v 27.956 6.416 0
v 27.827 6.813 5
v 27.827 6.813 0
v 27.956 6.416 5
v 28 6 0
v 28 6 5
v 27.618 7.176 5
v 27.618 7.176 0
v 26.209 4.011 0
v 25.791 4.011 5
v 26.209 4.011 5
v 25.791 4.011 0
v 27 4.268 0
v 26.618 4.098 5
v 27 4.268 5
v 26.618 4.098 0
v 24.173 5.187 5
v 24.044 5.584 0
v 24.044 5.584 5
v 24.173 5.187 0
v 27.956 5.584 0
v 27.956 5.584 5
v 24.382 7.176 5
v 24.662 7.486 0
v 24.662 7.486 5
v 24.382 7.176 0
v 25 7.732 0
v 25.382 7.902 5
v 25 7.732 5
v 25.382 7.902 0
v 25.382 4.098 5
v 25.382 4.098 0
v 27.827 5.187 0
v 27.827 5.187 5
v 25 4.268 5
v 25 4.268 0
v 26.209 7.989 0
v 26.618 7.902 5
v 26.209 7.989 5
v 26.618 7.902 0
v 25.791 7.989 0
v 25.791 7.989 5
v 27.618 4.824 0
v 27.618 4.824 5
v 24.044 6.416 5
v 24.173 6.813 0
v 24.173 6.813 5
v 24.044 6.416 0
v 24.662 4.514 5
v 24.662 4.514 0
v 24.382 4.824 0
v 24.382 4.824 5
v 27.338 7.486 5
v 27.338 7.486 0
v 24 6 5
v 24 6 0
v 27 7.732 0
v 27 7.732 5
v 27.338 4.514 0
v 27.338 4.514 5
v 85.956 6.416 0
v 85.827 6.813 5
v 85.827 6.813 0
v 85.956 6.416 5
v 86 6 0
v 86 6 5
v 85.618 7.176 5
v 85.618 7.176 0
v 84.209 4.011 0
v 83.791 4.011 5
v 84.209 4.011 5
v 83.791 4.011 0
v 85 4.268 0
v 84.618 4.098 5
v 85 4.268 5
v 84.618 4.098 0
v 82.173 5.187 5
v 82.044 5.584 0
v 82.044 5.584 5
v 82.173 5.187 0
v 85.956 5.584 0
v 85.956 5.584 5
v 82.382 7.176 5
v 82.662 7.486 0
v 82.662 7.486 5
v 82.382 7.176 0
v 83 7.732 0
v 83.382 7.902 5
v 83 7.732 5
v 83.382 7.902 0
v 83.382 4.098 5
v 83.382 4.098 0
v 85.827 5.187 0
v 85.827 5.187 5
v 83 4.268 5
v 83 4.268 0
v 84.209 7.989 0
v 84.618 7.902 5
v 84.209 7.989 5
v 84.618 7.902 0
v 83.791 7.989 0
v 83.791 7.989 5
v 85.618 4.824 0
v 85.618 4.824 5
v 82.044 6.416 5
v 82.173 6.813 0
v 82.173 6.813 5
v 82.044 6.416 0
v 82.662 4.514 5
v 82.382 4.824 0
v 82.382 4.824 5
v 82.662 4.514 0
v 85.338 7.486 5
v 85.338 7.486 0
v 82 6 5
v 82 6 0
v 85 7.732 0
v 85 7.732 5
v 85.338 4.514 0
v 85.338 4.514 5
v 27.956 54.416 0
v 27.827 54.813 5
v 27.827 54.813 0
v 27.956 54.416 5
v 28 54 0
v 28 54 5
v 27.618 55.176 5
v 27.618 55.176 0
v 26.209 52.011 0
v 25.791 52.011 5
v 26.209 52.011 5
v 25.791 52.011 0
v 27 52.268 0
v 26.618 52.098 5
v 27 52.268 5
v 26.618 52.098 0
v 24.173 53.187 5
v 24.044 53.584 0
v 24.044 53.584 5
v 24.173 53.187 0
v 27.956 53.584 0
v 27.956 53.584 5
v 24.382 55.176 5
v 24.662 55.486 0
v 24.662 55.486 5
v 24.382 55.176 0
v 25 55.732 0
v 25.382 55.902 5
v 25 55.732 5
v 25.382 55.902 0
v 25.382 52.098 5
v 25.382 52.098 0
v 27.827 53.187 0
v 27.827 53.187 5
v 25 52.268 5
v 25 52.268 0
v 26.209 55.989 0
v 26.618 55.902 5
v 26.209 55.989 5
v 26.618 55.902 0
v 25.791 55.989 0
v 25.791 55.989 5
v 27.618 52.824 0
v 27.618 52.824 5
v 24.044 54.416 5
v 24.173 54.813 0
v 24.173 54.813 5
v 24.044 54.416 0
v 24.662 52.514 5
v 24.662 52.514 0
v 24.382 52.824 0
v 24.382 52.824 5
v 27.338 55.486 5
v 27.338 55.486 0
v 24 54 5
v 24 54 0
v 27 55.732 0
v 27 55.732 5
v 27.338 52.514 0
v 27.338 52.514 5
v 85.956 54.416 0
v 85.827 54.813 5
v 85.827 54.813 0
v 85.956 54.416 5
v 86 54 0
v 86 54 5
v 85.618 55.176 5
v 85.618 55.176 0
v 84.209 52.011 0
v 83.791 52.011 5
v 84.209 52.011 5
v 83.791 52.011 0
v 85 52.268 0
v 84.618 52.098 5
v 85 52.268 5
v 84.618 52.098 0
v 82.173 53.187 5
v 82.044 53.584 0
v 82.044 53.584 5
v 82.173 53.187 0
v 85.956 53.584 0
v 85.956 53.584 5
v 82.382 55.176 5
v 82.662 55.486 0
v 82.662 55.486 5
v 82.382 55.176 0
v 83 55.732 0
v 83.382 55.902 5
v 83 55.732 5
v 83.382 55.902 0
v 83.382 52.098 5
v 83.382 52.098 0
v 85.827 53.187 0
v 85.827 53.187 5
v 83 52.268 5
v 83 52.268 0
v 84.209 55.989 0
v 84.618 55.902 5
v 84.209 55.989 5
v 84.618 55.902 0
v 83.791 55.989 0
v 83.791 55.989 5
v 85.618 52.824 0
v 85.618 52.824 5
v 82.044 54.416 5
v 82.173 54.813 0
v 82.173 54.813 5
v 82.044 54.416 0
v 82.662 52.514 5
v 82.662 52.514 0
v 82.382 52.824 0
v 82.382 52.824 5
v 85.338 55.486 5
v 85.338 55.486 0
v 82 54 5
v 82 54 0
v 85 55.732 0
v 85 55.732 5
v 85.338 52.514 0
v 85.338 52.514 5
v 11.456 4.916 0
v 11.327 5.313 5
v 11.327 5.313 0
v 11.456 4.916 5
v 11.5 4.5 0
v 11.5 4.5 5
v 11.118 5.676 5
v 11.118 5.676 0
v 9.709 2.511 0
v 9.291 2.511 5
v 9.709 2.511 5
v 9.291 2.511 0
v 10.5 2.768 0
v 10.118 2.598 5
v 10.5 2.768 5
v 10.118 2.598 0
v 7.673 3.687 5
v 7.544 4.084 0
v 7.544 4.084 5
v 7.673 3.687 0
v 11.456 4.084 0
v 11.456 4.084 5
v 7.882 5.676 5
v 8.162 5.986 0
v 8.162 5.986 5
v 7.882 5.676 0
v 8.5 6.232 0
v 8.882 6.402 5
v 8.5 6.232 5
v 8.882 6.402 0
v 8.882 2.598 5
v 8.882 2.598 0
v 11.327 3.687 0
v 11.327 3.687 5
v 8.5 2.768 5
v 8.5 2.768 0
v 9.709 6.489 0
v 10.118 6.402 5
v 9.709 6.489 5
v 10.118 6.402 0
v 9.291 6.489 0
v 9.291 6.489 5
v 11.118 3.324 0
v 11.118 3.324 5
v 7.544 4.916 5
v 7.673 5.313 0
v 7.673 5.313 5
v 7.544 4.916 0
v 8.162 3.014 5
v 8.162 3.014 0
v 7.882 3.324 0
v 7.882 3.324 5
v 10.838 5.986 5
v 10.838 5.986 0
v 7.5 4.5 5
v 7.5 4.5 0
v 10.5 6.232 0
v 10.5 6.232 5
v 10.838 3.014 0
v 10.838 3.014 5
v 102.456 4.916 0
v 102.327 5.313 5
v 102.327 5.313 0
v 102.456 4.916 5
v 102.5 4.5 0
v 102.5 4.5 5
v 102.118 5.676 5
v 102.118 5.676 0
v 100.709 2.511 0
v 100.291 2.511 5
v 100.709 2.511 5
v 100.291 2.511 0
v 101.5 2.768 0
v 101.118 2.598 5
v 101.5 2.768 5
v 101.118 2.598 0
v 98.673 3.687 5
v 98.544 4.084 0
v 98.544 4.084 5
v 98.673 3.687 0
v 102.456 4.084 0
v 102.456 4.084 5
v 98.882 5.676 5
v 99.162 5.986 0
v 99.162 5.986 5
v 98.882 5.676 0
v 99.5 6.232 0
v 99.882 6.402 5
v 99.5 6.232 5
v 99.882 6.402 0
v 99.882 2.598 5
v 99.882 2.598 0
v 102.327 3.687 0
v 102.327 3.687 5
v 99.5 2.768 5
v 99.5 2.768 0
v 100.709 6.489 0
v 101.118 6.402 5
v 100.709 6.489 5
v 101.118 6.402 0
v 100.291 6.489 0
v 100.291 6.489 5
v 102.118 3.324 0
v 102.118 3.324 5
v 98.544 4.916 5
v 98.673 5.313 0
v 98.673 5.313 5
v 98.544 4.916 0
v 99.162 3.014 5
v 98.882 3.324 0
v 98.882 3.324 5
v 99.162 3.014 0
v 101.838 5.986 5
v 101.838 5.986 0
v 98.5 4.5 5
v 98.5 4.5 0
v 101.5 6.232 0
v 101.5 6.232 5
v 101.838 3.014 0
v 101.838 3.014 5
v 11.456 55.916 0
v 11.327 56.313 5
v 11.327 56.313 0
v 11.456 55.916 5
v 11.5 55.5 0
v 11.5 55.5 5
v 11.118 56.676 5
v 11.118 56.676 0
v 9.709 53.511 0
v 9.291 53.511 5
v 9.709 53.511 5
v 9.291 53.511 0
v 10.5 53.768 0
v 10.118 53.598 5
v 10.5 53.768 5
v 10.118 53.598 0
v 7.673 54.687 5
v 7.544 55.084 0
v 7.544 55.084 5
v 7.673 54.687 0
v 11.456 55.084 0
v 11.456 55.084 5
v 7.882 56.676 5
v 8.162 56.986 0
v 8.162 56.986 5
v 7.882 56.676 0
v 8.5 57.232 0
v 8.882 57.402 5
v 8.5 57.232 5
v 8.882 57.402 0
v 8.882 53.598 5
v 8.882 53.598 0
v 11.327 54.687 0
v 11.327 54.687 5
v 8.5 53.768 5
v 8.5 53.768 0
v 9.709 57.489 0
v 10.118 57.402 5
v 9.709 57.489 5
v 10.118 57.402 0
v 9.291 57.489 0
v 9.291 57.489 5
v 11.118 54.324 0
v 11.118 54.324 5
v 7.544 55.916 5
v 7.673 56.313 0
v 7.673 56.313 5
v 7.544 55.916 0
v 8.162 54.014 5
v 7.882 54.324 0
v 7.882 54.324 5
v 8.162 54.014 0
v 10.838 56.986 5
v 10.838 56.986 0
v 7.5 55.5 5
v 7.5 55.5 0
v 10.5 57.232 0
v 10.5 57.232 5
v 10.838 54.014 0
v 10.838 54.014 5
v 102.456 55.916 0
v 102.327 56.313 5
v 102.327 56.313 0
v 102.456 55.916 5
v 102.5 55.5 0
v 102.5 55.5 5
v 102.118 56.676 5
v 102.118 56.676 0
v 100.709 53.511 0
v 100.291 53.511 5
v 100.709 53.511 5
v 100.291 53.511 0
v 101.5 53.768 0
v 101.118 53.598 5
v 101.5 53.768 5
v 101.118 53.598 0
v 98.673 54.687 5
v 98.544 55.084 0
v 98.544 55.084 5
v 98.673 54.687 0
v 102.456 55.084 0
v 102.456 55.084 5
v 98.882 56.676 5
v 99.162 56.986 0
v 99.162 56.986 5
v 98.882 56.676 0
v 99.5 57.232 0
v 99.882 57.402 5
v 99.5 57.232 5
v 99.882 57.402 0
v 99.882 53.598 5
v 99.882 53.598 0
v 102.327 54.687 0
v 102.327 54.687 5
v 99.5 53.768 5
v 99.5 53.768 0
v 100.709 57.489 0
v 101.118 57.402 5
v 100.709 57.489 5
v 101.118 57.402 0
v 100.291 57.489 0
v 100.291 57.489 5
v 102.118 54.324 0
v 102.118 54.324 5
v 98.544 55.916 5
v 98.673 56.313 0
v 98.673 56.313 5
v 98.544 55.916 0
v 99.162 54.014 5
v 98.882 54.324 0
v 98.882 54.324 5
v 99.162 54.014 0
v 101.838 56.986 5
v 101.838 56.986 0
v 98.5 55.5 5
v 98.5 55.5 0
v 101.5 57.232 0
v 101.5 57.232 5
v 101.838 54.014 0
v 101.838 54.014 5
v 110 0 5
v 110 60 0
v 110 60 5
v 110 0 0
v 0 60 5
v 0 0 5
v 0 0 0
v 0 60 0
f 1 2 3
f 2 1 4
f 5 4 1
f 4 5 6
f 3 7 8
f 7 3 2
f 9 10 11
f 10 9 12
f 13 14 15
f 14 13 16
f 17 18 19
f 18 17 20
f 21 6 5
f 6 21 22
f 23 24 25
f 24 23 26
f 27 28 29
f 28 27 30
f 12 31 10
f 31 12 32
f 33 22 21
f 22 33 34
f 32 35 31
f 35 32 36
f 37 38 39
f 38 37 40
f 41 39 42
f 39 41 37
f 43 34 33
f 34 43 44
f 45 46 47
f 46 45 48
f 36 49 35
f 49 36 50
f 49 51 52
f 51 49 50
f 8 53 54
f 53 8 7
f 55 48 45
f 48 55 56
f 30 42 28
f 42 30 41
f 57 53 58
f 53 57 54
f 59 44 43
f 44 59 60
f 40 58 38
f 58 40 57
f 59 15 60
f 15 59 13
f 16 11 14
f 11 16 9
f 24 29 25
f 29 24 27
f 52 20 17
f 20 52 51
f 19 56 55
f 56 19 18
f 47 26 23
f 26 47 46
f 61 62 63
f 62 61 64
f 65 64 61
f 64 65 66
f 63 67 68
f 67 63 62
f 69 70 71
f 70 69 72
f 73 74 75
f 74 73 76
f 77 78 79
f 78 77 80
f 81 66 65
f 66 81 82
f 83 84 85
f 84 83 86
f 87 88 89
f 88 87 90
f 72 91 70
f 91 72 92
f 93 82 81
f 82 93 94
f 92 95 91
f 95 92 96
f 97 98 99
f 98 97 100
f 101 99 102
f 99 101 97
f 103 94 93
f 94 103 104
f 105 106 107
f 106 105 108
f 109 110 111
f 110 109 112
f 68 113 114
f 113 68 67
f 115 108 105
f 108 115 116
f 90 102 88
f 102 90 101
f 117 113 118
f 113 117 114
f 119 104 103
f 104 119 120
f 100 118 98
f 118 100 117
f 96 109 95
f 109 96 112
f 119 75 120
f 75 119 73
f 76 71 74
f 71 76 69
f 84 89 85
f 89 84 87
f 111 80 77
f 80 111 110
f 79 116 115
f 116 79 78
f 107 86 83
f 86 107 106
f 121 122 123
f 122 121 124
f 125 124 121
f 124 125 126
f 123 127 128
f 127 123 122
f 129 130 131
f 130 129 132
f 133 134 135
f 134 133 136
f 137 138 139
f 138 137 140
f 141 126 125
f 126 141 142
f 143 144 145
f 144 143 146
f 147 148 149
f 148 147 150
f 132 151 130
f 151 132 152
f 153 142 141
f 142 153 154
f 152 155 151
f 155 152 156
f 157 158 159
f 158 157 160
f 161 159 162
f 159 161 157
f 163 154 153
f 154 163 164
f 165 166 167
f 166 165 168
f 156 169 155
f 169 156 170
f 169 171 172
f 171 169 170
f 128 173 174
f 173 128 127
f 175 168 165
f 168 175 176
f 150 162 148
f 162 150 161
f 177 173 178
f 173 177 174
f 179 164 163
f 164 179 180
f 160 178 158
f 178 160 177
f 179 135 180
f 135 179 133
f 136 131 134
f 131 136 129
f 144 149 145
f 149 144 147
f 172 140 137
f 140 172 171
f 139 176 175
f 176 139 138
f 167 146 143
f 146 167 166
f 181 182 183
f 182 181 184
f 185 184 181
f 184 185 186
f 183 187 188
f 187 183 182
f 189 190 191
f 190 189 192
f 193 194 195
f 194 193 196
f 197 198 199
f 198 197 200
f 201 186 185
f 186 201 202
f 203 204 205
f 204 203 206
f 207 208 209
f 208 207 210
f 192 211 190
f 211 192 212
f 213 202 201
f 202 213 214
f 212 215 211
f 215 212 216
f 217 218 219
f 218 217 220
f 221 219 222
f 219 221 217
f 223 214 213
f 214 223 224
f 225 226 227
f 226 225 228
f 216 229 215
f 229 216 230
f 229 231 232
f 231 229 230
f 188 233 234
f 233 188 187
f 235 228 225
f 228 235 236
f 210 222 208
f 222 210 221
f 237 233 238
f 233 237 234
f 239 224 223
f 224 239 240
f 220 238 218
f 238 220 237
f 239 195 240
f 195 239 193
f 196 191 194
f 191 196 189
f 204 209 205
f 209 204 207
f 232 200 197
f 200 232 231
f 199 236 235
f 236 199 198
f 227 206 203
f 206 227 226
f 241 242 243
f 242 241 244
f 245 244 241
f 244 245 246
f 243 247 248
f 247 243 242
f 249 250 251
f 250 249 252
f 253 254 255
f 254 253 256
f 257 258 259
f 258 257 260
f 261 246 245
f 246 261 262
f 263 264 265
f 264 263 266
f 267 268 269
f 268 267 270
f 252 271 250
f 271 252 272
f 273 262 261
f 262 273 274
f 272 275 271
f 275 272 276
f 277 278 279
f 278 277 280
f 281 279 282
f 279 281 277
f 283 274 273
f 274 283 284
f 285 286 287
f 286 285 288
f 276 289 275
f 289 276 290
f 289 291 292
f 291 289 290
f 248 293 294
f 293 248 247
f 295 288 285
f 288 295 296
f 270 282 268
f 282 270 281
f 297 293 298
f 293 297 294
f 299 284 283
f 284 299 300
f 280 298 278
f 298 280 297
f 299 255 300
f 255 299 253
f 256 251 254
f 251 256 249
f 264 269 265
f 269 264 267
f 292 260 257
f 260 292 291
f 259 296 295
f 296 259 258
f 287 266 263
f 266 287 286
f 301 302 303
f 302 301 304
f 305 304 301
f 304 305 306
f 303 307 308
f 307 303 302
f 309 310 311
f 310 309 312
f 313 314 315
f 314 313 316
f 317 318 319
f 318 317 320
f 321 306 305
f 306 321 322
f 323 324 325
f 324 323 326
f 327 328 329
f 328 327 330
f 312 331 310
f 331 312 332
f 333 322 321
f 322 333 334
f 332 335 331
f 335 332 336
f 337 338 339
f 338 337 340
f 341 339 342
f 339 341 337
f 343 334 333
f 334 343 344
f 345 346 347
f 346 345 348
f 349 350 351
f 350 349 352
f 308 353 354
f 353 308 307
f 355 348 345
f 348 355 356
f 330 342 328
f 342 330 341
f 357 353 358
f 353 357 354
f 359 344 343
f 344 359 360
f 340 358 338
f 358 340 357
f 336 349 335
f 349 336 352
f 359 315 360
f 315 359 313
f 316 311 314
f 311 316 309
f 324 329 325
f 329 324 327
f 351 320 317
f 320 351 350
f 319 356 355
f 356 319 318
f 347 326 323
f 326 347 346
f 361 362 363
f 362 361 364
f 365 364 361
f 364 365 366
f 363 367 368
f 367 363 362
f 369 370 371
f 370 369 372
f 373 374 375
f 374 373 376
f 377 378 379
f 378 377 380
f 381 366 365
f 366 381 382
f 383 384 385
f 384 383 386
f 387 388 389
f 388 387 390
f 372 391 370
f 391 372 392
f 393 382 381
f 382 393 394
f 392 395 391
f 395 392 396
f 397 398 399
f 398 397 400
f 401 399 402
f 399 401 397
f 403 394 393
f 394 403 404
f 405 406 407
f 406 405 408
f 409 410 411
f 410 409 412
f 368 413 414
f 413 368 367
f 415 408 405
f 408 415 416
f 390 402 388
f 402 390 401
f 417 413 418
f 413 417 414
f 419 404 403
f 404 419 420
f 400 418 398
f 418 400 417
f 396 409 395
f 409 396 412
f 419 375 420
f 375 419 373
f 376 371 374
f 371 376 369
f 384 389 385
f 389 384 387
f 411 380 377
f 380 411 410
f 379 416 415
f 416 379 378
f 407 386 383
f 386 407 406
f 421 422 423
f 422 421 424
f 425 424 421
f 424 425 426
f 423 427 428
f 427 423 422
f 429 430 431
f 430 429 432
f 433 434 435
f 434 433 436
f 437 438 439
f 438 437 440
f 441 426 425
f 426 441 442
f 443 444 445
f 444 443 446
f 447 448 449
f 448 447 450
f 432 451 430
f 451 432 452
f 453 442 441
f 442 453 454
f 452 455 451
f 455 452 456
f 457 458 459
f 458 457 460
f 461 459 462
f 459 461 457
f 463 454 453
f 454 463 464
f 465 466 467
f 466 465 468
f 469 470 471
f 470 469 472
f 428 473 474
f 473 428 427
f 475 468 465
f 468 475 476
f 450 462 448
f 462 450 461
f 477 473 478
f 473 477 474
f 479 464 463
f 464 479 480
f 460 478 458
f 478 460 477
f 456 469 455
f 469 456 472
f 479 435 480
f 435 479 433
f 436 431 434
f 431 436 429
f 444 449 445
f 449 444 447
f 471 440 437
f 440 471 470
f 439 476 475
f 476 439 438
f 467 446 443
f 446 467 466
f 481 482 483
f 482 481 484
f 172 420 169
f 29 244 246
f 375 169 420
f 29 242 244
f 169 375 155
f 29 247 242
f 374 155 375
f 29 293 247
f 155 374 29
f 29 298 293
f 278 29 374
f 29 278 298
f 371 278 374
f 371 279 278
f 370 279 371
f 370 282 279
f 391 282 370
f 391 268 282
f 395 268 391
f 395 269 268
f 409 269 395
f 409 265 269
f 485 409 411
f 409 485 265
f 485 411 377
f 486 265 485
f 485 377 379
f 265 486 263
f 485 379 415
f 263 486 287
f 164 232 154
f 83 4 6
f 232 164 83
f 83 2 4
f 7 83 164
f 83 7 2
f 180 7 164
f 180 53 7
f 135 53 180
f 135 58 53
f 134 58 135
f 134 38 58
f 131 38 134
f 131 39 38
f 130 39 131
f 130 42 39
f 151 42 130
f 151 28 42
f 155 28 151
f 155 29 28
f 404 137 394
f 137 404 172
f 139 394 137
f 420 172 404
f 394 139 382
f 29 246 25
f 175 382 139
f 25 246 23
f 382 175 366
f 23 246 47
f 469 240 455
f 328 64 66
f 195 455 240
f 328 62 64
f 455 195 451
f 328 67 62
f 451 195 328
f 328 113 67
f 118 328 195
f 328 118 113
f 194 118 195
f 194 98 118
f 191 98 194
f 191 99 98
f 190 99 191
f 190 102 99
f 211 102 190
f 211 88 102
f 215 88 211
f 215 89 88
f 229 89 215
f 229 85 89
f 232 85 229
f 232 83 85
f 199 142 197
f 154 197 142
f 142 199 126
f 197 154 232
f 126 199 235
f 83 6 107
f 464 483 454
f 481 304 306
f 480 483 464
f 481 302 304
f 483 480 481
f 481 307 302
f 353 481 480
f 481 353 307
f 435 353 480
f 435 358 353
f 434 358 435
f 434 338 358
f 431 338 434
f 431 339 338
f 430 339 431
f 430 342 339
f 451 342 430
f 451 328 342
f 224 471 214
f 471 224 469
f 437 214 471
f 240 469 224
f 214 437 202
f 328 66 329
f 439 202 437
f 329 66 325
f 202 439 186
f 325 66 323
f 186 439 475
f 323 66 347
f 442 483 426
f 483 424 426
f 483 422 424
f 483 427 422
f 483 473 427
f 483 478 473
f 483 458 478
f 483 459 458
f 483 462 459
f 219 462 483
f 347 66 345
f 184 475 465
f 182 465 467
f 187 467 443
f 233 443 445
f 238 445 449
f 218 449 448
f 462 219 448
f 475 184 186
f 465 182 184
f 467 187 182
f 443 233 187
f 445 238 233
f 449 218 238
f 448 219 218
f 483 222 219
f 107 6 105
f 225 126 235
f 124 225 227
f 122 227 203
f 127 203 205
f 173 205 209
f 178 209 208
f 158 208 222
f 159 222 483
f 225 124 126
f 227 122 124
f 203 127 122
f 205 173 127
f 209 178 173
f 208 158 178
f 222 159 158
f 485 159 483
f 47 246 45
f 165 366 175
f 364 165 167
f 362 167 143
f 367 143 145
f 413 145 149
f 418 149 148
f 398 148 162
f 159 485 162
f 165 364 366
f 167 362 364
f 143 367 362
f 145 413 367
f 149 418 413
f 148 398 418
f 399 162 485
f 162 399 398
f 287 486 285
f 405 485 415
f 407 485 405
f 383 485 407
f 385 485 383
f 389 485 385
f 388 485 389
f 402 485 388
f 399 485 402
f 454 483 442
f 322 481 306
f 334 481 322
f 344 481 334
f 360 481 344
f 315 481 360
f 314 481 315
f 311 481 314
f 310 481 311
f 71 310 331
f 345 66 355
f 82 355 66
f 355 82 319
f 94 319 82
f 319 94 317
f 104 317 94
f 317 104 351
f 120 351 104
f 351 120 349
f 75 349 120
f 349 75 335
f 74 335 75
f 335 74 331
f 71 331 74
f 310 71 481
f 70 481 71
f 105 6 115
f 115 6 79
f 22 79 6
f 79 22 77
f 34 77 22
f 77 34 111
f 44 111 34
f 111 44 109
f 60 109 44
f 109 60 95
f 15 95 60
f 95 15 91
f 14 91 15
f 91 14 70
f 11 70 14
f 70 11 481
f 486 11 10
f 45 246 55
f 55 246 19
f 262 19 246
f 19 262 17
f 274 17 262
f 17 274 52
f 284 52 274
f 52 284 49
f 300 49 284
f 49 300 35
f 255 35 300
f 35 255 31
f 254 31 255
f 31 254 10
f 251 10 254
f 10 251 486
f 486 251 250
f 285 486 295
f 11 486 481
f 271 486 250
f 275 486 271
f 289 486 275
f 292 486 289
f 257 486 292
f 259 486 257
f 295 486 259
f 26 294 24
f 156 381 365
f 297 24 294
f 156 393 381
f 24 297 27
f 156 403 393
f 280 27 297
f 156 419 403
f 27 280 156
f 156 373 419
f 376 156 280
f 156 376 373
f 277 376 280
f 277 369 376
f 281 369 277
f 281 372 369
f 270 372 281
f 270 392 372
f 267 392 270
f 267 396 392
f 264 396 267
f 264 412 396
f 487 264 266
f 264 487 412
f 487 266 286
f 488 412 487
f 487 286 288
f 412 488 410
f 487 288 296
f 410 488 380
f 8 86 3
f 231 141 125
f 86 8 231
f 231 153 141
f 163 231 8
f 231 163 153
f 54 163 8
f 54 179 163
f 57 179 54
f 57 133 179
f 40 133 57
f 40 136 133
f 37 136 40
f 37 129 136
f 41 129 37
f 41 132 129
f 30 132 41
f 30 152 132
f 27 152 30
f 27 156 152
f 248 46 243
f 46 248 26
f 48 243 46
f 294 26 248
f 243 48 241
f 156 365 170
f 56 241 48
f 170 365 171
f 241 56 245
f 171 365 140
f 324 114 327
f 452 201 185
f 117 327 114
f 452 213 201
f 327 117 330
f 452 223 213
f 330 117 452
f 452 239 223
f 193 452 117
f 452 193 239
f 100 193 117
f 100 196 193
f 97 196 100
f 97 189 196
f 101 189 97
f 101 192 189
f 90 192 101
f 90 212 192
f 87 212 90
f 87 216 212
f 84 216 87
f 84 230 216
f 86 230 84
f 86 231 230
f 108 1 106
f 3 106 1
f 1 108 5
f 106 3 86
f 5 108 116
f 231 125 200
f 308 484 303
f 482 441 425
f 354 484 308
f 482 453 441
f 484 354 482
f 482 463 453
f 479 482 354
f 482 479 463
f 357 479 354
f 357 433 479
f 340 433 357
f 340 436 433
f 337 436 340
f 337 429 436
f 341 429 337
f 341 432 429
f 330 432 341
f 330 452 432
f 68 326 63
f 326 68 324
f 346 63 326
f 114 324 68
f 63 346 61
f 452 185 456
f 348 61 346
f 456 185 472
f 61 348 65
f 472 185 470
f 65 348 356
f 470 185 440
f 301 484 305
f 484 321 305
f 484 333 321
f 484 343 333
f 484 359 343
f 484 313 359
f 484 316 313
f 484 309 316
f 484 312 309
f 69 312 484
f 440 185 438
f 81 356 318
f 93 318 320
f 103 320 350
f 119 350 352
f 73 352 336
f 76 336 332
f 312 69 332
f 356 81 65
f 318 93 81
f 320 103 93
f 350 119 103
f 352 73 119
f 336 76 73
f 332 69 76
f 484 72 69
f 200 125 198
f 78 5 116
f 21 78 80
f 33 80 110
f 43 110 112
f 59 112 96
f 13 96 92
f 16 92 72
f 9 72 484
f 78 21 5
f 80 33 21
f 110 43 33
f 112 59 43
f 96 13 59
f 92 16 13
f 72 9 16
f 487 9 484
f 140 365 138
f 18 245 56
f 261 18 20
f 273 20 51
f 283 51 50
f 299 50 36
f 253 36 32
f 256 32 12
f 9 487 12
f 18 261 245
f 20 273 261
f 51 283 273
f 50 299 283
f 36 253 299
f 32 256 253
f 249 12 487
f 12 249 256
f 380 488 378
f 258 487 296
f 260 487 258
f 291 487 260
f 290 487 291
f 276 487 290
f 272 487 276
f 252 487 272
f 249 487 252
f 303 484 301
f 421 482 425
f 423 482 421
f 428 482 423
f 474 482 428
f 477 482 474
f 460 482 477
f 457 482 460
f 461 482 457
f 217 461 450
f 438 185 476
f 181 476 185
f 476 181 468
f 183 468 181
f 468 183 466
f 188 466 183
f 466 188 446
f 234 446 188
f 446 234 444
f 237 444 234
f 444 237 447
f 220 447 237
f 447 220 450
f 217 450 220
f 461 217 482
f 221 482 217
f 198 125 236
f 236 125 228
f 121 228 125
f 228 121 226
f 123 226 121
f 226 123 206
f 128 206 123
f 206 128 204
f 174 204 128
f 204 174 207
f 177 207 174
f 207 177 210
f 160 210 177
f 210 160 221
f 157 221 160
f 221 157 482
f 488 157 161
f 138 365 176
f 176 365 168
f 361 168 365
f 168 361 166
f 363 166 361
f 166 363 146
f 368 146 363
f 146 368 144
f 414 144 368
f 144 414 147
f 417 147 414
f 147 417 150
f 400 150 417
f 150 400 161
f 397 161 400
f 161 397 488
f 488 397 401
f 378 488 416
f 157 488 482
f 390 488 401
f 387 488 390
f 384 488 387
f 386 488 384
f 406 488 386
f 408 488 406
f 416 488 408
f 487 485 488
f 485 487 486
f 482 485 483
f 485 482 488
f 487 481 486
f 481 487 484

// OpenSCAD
$fn=30;
BASE_LEN=110;
BASE_WIDTH=60;
PI_WIDTH=54;
PI_LEN=64;
OUTSIDE_WIDTH=57;
OUTSIDE_LEN=97;
CYLINDER=3;



module cylinders(h,r,width,length){
    for(i=[0:width:width]){
        for(n=[0:length:length]){
            translate([CYLINDER+n,CYLINDER+i,0])cylinder(h,r,r);
        }        
    }
}

difference(){
    cube([BASE_LEN,BASE_WIDTH,5]);
    translate([(BASE_LEN-PI_LEN)/2,(BASE_WIDTH-PI_WIDTH)/2,-1])cylinders(10,2,PI_WIDTH-CYLINDER*2,PI_LEN-CYLINDER*2);
    translate([(BASE_LEN-OUTSIDE_LEN)/2,(BASE_WIDTH-OUTSIDE_WIDTH)/2,-1])cylinders(10,2,OUTSIDE_WIDTH-CYLINDER*2,OUTSIDE_LEN-CYLINDER*2);
}
